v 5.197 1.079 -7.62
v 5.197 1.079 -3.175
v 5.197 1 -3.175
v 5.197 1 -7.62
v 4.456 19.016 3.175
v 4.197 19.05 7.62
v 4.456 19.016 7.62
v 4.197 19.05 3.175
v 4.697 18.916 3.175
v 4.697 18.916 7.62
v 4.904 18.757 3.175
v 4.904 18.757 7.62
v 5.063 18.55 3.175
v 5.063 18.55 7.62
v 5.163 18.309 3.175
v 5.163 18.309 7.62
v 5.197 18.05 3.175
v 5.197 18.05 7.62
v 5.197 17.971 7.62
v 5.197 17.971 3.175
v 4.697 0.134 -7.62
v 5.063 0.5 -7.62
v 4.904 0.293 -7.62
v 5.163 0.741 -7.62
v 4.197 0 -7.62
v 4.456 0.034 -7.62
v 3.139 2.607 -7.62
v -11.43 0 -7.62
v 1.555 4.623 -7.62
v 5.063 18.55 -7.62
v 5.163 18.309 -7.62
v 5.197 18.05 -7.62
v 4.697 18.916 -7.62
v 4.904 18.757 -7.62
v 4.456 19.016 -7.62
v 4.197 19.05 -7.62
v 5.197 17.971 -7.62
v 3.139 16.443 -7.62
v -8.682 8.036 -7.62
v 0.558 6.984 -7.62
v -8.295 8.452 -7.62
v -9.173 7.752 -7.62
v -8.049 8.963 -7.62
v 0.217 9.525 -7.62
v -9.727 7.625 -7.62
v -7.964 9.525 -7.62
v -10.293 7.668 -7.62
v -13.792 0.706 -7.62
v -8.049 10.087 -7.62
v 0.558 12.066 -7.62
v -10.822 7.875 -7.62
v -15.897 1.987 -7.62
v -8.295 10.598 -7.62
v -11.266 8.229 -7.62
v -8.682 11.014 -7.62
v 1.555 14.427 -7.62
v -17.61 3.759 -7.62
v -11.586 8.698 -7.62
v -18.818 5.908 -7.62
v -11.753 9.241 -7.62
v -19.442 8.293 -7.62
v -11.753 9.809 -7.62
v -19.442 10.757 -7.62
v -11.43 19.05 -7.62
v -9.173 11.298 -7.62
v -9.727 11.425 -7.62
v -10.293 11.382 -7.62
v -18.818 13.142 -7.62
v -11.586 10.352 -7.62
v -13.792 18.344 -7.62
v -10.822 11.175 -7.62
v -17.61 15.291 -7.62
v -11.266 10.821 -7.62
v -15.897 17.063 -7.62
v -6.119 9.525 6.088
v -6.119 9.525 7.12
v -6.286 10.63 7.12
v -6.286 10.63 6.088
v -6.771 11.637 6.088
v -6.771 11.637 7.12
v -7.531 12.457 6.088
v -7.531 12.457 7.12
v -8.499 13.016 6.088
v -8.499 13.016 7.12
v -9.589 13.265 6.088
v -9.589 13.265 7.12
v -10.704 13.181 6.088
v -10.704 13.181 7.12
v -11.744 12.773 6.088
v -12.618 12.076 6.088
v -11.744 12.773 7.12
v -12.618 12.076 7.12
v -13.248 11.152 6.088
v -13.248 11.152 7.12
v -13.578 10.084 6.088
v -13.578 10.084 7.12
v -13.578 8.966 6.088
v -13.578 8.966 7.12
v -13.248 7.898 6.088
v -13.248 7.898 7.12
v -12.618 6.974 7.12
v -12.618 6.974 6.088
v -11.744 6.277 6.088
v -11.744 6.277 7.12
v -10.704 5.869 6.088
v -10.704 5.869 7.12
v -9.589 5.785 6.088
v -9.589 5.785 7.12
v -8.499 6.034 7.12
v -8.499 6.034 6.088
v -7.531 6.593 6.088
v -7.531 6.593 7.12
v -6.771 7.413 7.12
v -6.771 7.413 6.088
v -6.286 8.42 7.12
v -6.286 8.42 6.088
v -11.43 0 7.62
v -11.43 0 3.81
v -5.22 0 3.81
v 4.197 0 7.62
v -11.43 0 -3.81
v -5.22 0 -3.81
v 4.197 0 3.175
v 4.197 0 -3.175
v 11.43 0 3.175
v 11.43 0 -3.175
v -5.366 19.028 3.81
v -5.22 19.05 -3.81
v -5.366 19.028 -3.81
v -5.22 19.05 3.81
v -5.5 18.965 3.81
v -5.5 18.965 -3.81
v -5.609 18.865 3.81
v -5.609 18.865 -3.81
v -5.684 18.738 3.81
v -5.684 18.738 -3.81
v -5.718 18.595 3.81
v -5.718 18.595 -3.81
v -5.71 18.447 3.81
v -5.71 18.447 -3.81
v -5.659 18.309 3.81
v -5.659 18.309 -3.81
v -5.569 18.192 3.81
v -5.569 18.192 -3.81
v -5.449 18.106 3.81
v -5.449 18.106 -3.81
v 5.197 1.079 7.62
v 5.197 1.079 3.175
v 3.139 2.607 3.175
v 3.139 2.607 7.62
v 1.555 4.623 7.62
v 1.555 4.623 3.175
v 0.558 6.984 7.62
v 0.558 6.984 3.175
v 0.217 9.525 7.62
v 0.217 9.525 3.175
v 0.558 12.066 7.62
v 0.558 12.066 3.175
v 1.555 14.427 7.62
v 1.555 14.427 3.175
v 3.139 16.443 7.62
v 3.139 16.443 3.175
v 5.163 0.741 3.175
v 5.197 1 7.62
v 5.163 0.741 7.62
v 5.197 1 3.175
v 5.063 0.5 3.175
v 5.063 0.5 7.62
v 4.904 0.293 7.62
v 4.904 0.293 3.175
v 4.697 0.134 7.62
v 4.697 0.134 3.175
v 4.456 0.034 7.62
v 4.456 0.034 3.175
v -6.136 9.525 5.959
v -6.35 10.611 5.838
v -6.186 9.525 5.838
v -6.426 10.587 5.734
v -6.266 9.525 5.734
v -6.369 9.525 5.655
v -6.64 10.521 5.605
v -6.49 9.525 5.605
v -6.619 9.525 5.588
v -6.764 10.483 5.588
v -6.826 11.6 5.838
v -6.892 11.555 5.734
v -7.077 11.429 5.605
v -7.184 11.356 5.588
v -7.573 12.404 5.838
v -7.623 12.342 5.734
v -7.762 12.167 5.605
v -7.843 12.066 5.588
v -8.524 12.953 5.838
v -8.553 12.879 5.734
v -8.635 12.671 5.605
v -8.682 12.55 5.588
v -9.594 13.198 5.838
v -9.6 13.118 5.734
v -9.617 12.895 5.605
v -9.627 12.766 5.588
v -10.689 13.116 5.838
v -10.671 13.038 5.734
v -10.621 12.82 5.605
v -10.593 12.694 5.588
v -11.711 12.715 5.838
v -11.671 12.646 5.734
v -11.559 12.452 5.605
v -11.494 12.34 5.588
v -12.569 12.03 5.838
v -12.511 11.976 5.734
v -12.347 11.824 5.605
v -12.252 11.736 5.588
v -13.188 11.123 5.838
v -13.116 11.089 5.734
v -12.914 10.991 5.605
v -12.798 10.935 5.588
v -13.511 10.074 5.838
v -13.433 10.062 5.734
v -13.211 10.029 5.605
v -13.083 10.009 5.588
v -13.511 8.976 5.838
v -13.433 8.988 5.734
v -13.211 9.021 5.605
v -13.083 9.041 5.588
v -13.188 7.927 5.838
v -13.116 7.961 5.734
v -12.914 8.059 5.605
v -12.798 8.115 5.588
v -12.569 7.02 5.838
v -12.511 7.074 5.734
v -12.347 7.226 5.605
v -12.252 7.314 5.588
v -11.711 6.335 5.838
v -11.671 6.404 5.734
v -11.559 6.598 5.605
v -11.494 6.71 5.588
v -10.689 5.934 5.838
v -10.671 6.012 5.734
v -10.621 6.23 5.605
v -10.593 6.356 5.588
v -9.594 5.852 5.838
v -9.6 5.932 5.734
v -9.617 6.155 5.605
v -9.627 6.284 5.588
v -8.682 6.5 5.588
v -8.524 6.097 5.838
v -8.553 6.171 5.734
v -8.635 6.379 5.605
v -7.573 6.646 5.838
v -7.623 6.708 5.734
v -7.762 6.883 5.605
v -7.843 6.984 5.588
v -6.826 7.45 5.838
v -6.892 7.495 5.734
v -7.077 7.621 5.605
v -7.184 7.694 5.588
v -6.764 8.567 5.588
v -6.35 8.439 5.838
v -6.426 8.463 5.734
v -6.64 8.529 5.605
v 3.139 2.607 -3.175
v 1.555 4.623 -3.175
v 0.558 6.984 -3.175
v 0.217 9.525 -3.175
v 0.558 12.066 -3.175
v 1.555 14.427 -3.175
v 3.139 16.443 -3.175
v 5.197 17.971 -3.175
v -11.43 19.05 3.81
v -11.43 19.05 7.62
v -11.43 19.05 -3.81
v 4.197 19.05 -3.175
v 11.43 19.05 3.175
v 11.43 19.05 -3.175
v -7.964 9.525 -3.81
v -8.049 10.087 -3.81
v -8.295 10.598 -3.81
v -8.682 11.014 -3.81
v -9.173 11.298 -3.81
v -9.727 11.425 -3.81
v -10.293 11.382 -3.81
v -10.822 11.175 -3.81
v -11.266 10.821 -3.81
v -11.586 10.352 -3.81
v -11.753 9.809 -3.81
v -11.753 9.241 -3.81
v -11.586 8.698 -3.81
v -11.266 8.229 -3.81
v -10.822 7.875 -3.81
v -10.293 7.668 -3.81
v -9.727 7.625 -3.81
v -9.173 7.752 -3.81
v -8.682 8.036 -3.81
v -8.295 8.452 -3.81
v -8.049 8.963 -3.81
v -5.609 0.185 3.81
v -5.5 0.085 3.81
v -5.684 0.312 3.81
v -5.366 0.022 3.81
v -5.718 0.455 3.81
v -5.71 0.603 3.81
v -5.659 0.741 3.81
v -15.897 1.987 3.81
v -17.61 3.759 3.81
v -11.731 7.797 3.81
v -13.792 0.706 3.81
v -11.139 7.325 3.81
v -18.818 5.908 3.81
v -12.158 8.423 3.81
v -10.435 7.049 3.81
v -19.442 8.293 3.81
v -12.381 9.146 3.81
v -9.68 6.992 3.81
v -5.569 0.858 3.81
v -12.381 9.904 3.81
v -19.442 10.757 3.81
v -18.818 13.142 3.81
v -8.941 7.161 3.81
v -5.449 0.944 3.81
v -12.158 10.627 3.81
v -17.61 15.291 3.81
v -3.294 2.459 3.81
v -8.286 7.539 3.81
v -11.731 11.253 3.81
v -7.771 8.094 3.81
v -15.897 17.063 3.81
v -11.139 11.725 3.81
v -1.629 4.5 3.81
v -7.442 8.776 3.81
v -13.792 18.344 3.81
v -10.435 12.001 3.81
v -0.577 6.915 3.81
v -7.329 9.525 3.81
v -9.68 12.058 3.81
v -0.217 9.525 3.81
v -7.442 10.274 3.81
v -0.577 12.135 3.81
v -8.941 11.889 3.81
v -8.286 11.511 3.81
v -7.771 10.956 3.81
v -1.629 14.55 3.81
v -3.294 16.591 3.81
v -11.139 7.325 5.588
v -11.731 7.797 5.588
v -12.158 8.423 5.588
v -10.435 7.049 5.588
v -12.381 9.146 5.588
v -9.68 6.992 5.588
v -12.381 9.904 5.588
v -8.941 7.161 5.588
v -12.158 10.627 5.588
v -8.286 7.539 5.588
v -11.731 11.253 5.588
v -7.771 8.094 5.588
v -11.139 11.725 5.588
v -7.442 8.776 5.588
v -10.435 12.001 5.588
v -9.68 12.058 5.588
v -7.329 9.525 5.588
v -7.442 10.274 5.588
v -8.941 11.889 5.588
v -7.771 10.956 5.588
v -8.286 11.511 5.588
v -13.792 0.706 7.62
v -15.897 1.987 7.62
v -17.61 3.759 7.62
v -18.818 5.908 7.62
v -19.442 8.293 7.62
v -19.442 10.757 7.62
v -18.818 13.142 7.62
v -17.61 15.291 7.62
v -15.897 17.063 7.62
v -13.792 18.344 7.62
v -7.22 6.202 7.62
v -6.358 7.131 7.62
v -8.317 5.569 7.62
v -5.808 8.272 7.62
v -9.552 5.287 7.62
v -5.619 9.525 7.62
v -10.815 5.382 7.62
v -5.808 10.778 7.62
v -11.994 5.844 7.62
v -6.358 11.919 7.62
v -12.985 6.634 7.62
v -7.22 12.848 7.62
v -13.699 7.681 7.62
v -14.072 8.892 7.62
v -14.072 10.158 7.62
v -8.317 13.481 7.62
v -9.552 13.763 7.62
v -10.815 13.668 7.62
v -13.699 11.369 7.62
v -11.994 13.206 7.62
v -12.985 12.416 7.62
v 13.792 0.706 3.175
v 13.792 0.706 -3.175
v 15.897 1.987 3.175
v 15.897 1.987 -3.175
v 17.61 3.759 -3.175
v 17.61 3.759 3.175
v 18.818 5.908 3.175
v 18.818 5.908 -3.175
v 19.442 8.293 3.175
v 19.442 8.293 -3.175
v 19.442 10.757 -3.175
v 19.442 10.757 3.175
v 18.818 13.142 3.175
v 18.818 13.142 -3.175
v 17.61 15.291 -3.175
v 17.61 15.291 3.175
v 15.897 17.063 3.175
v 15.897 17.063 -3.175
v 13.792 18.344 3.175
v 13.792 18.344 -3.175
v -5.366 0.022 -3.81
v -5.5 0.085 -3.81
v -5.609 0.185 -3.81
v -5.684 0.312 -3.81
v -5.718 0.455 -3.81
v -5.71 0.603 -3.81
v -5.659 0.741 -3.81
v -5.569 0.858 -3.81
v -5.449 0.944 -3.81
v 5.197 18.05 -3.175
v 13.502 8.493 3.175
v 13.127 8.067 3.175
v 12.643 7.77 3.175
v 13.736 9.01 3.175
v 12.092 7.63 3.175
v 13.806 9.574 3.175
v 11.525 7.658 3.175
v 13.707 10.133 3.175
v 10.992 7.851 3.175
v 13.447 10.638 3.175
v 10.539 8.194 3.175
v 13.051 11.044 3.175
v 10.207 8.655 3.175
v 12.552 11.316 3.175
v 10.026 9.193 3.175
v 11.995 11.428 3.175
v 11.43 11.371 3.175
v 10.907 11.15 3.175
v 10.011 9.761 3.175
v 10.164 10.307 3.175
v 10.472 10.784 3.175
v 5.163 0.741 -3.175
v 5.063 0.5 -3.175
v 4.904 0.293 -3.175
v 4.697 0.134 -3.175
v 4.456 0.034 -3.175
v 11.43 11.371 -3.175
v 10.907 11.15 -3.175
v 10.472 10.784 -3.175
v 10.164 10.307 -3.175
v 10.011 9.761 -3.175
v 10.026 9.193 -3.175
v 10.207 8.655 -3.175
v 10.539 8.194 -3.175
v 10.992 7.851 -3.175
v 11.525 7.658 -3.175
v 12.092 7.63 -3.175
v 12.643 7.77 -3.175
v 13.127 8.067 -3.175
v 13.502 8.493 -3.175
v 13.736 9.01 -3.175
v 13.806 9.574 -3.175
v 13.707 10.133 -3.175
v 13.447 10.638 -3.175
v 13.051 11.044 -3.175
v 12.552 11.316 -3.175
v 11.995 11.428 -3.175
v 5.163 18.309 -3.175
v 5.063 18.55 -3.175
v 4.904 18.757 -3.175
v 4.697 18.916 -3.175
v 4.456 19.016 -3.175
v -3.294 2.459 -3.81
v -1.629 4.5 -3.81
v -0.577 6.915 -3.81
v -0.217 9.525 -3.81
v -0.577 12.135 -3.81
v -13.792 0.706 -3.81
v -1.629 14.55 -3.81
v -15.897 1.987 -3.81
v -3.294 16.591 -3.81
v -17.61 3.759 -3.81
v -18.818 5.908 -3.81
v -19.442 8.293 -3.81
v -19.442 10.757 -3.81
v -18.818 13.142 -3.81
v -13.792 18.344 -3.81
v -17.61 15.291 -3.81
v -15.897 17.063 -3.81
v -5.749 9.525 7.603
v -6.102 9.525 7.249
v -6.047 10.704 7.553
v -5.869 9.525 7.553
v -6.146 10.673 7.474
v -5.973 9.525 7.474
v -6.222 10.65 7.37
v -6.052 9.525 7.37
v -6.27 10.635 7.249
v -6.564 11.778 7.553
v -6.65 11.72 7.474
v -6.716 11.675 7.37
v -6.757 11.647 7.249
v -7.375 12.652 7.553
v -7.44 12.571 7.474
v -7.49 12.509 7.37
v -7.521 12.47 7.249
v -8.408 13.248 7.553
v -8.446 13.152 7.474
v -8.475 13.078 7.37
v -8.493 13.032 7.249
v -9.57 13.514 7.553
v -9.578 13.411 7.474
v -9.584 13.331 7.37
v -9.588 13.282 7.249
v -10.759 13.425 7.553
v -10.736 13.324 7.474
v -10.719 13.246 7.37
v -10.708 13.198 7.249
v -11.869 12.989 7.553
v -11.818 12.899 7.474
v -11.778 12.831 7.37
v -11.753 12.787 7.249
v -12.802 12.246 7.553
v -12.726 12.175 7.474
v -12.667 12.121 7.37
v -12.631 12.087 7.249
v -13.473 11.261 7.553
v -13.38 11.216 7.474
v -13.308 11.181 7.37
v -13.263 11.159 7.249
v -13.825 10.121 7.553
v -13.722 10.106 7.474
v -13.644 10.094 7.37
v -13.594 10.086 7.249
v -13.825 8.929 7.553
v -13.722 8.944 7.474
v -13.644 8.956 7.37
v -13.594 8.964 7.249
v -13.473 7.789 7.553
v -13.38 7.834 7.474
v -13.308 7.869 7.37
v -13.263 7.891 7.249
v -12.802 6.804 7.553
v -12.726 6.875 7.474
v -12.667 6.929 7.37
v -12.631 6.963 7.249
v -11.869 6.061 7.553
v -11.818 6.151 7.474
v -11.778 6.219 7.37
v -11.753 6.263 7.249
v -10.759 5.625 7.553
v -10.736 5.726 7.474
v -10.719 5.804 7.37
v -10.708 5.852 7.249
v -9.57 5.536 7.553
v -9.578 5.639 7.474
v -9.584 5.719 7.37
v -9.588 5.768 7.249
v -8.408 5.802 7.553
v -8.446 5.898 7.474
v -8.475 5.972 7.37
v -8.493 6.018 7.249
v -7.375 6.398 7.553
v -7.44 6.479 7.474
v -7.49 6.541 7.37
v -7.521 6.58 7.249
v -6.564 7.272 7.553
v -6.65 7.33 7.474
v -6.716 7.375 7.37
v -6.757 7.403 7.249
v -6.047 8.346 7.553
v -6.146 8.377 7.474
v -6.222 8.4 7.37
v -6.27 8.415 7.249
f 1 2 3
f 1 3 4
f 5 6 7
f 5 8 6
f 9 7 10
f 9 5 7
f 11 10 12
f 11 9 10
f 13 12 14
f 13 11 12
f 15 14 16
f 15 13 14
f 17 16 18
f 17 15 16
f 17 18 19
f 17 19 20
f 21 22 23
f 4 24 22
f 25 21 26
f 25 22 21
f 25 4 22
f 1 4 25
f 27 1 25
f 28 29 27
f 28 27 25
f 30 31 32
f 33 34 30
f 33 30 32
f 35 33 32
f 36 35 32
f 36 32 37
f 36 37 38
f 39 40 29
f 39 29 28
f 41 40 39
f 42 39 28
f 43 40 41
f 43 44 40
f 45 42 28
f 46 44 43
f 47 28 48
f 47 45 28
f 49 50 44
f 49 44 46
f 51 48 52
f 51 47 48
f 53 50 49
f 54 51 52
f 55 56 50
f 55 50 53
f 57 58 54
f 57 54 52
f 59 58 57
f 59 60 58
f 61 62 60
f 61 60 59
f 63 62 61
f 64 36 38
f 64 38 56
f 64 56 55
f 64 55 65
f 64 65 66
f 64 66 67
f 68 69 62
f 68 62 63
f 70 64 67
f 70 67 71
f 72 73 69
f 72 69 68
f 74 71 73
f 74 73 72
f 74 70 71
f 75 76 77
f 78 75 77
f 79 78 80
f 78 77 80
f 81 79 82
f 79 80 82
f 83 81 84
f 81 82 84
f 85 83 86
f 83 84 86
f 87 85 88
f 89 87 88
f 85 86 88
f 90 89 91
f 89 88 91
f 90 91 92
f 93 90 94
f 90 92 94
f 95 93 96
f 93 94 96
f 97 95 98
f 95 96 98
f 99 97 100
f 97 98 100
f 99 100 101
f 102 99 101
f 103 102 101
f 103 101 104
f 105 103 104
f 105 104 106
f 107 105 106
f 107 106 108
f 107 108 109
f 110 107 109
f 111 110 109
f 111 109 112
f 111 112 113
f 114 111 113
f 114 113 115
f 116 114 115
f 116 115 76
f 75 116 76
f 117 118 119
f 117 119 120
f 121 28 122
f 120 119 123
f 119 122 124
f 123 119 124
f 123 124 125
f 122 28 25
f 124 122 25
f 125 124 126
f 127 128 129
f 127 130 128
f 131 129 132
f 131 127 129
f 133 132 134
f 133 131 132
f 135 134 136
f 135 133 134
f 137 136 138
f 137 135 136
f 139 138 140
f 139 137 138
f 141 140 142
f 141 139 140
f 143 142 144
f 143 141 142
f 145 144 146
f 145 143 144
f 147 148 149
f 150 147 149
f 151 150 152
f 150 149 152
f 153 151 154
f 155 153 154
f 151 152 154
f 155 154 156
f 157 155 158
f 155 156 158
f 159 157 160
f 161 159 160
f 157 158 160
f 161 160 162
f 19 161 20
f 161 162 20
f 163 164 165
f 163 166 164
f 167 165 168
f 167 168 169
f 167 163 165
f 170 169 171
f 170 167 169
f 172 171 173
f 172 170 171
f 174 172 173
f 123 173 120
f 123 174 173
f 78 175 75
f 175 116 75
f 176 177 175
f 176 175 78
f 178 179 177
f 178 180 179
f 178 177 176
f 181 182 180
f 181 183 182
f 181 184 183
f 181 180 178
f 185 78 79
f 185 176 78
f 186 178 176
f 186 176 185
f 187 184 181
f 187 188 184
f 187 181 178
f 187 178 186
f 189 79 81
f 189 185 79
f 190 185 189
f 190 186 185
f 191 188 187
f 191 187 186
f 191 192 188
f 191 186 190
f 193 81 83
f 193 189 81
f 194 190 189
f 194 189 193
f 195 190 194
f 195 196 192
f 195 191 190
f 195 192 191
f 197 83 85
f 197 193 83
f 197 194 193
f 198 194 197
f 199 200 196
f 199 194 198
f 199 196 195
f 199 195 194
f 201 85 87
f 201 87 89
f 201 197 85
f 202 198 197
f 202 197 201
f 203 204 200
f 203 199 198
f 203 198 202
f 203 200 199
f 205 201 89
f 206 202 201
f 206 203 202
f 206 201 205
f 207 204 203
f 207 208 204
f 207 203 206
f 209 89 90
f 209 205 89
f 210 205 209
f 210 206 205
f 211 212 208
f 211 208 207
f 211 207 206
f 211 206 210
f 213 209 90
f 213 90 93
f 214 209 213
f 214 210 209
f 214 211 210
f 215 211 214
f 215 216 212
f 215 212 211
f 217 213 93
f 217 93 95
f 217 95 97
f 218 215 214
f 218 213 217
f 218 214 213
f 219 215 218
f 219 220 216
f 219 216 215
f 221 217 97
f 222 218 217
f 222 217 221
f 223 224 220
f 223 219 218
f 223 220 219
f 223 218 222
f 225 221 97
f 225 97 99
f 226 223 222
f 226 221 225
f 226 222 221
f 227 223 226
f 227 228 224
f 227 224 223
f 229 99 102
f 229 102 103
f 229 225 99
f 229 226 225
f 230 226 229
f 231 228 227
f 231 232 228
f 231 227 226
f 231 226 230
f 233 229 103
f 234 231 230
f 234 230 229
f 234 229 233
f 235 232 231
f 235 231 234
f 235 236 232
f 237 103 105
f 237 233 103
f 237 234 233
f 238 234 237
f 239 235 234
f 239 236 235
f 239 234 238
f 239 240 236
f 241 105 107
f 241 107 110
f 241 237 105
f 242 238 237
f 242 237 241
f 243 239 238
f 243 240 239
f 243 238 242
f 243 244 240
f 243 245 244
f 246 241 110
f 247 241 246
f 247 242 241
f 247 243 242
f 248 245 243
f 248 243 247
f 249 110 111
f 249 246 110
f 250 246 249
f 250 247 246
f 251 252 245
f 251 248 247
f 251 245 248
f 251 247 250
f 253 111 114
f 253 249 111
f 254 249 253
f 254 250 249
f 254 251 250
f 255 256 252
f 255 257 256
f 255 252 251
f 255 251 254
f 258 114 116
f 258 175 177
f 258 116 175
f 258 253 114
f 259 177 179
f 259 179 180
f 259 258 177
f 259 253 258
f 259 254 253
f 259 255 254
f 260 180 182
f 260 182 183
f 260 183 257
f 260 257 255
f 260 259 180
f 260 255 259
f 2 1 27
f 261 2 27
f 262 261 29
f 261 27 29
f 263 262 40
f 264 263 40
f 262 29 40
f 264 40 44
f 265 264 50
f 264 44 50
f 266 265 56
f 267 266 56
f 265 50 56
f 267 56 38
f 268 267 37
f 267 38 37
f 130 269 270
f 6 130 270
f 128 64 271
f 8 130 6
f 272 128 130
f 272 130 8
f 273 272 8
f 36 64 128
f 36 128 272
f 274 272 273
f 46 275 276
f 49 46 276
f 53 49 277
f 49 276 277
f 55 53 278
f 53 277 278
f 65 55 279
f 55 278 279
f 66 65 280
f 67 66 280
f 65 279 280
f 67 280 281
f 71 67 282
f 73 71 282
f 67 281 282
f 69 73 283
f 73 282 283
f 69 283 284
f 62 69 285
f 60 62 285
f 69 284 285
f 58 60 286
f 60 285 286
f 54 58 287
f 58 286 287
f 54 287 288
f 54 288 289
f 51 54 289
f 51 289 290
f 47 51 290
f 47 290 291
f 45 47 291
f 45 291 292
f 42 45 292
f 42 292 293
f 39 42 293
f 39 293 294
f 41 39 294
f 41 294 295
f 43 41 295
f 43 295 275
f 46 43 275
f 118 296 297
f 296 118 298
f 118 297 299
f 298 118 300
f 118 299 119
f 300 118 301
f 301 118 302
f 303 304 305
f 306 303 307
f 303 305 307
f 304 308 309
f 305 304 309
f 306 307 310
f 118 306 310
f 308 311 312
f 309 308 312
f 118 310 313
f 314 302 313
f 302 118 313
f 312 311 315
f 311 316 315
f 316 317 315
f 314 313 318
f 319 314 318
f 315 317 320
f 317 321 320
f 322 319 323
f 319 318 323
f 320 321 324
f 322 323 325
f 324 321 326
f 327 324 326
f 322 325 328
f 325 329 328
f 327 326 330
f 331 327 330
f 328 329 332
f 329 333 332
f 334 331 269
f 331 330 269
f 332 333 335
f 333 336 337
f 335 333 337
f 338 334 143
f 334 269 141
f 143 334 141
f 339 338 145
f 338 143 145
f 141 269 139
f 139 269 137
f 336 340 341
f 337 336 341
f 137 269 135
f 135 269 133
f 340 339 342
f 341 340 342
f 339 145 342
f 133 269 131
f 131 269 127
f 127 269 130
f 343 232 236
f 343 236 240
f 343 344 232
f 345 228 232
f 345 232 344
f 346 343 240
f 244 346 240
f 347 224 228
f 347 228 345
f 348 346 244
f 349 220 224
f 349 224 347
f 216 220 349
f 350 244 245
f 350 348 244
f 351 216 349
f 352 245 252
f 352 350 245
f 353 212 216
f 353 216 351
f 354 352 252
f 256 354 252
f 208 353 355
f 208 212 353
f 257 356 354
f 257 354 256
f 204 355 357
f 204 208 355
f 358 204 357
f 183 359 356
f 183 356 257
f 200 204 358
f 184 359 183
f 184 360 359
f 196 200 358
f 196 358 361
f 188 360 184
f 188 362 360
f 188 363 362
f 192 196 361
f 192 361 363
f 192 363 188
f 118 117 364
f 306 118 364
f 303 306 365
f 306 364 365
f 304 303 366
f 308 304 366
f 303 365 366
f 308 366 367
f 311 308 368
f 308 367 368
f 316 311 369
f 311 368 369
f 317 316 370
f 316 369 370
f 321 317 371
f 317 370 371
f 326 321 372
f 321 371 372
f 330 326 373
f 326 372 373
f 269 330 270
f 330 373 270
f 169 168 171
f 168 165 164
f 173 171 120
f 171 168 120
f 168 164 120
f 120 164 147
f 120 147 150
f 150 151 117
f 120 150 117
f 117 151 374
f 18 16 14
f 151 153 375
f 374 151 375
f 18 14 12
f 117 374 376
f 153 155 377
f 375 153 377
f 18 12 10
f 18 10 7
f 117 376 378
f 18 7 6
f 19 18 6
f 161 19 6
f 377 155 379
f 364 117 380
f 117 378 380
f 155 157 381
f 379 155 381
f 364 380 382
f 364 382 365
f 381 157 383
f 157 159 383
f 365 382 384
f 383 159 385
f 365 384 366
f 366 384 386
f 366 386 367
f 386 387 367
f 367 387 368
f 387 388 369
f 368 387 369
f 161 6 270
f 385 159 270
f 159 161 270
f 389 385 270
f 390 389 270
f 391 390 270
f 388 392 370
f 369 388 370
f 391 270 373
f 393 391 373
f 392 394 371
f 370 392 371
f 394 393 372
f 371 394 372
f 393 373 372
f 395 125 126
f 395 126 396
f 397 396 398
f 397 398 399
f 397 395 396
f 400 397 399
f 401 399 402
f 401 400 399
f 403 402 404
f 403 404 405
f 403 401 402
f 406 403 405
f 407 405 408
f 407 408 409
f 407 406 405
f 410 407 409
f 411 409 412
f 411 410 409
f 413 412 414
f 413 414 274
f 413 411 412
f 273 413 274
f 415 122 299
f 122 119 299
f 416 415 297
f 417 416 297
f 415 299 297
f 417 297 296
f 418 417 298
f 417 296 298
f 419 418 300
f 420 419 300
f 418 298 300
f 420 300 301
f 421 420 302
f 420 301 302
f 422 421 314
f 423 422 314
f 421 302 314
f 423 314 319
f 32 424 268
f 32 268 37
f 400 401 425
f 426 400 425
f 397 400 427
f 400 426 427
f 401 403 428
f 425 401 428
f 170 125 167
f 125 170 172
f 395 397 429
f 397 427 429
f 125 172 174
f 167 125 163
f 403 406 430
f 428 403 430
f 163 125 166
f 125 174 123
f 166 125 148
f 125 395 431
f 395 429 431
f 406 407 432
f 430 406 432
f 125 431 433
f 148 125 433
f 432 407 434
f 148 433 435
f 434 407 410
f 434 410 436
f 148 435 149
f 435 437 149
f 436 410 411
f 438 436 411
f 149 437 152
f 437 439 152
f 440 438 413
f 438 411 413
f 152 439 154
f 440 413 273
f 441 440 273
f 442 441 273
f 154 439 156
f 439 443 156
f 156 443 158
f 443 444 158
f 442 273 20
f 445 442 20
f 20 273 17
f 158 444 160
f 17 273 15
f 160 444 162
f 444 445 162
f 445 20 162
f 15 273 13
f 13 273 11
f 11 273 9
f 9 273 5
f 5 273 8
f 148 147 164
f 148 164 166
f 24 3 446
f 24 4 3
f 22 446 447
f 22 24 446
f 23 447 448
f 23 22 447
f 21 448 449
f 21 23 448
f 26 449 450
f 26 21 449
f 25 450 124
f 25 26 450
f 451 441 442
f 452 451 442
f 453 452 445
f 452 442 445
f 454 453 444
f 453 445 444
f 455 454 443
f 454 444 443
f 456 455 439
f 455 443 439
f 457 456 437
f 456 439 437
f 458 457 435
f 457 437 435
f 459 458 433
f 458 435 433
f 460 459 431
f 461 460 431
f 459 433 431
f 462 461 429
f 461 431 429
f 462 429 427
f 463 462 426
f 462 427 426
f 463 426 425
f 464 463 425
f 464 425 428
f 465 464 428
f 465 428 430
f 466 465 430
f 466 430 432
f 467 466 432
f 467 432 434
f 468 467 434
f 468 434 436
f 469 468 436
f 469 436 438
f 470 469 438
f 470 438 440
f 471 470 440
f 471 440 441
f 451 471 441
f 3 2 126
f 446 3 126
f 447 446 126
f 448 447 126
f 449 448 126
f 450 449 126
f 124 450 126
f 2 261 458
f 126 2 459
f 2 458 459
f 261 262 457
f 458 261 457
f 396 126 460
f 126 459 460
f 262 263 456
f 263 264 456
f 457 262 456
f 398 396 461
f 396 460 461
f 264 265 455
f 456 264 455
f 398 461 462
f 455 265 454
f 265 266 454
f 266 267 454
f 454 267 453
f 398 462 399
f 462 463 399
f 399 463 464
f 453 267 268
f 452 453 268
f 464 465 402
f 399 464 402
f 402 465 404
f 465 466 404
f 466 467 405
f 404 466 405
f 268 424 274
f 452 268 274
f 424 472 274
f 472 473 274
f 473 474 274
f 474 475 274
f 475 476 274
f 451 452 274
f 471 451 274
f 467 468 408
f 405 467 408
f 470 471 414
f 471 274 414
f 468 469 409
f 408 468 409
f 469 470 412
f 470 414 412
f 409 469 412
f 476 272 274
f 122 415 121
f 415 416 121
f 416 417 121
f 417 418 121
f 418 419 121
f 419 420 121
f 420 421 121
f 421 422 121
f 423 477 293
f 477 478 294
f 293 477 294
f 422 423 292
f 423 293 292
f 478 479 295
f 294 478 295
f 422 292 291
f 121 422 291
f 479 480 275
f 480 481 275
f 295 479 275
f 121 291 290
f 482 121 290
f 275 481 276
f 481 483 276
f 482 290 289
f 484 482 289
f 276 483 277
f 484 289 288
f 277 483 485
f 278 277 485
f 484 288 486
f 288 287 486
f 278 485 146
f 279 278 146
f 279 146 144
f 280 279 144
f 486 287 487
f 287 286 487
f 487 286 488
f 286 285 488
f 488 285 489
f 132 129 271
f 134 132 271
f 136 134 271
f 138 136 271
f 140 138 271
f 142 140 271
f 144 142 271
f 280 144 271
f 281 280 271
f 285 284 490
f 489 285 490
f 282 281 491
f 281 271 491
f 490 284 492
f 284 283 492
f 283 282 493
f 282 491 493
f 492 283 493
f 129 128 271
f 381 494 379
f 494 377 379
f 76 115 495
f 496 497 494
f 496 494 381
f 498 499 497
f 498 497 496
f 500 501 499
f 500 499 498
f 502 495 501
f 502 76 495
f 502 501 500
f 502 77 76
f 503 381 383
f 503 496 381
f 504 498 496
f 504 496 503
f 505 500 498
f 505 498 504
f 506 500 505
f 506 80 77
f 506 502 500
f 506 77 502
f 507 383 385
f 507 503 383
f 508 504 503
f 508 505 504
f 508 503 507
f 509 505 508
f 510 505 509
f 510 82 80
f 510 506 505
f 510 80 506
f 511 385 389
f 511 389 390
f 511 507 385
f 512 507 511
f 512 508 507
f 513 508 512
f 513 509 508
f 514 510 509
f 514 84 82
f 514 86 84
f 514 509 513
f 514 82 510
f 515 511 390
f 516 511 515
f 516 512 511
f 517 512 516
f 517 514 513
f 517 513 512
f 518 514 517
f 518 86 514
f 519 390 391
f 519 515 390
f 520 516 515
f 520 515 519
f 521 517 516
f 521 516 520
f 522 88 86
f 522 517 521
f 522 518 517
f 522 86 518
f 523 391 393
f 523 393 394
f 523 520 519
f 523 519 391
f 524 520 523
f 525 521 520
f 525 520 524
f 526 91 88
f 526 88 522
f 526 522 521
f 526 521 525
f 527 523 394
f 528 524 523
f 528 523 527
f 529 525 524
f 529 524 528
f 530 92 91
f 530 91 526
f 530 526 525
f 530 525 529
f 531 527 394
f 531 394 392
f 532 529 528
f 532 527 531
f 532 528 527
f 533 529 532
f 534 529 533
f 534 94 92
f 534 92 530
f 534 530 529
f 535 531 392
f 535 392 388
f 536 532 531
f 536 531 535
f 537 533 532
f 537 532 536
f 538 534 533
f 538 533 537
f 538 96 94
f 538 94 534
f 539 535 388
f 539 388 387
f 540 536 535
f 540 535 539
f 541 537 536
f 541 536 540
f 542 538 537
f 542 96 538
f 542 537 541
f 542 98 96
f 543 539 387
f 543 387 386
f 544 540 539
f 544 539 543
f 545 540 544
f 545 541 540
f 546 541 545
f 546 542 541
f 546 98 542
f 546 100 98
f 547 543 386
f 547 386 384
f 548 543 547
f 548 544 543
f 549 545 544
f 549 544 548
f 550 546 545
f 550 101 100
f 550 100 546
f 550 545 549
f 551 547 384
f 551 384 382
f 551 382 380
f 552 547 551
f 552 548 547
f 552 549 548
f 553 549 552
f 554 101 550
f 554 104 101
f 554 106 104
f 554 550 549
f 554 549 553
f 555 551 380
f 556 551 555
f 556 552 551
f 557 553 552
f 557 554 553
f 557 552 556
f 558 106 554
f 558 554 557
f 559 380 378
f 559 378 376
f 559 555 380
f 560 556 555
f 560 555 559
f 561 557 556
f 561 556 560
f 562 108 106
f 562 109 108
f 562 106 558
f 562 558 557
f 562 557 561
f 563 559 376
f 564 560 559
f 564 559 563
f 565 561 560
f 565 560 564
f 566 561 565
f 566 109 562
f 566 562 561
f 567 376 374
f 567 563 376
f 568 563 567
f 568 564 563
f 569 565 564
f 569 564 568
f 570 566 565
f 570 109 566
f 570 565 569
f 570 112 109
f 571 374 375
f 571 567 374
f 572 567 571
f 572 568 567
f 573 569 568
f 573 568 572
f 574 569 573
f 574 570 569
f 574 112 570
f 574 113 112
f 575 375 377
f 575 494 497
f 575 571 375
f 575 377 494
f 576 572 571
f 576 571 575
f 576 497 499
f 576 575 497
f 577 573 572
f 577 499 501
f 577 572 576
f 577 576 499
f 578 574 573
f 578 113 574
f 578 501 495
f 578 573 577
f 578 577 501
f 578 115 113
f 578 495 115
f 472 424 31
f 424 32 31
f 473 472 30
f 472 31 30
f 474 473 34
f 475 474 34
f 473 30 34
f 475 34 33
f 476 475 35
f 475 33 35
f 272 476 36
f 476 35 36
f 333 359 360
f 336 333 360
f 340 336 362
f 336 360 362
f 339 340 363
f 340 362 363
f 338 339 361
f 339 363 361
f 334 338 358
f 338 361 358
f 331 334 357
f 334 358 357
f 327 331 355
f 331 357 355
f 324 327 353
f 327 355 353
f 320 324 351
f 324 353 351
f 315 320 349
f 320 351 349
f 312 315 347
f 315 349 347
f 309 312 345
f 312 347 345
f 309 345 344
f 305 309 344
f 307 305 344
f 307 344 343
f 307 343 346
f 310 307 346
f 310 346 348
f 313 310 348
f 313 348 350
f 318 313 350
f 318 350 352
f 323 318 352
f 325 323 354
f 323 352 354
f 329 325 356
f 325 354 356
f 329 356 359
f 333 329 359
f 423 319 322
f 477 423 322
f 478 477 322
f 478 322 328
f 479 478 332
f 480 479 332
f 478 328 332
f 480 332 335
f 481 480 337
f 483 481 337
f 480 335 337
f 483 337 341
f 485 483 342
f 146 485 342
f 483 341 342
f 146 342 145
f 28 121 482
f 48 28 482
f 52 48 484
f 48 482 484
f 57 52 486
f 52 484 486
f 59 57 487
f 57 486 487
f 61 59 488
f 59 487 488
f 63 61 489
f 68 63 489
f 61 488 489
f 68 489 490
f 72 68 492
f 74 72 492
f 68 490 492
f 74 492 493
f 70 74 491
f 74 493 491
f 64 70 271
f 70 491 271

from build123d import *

# Parameters (mm, degrees)
SKETCH1_W                                       = 22.86
SKETCH1_H                                       = 15.24
BOSS_EXTRUDE1_DEPTH                             = 19.05
BOSS_EXTRUDE3_DEPTH                             = 3.81
LPATTERN1_COUNT                                 = 2
LPATTERN1_PITCH                                 = 11.43
SKETCH5_R                                       = 1.905
CUT_EXTRUDE2_DEPTH                              = 16.24
CUT_EXTRUDE3_DEPTH                              = 3.81
BOSS_EXTRUDE6_DEPTH                             = 3.175
SKETCH9_R                                       = 1.905
CUT_EXTRUDE4_DEPTH                              = 6.35
CUT_EXTRUDE5_DEPTH                              = 4.445
LPATTERN2_COUNT                                 = 2
LPATTERN2_PITCH                                 = 10.795
CBORE_FOR_6_PAN_HEAD_MACHINE_SCREW3_D           = 3.7500052
CBORE_FOR_6_PAN_HEAD_MACHINE_SCREW3_CBORE_D     = 7.5000104
CBORE_FOR_6_PAN_HEAD_MACHINE_SCREW3_CBORE_DEPTH = 2.032
SKETCH18_R                                      = 2.54
CUT_EXTRUDE8_DEPTH                              = 1.778
FILLET2_R                                       = 0.5
FILLET3_R                                       = 0.5
SKETCH19_W                                      = 3.111810153
SKETCH19_H                                      = 4.445
CUT_EXTRUDE9_DEPTH                              = 19.05
LPATTERN3_COUNT                                 = 2
LPATTERN3_PITCH                                 = 10.795
FILLET4_R                                       = 1


with BuildPart() as part:
    # Sketch1 → Boss-Extrude1 (new body)
    with BuildSketch(Plane(origin=(0, 0, 0), x_dir=(1, 0, 0), z_dir=(0, 1, 0))):
        Rectangle(SKETCH1_W, SKETCH1_H)
    extrude(amount=BOSS_EXTRUDE1_DEPTH)

    # Sketch3 → Boss-Extrude3 (add)
    with BuildSketch(Plane.XY.offset(7.62)):
        with BuildLine():
            Line((-11.43, 19.05), (-11.43, 0))
            ThreePointArc((-11.43, 0), (-19.521397873, 9.525), (-11.43, 19.05))
        make_face()
    boss_extrude3 = extrude(amount=-BOSS_EXTRUDE3_DEPTH)

    # LPattern1: Boss-Extrude3 ×2
    with Locations(*[(0, 0, -i * LPATTERN1_PITCH) for i in range(1, LPATTERN1_COUNT)]):
        add(boss_extrude3)

    # Sketch5 → Cut-Extrude2 (cut, through all)
    with BuildSketch(Plane.XY.offset(7.62)):
        with Locations((-9.869397873, 9.525)):
            Circle(SKETCH5_R)
    extrude(amount=-CUT_EXTRUDE2_DEPTH, mode=Mode.SUBTRACT)

    # Sketch6 → Cut-Extrude3 (cut, symmetric)
    with BuildSketch(Plane.XY):
        with BuildLine():
            Line((-11.43, 19.05), (-11.43, 0))
            ThreePointArc((-11.43, 0), (-0.217397873, 9.525), (-11.43, 19.05))
        make_face()
    extrude(amount=CUT_EXTRUDE3_DEPTH, both=True, mode=Mode.SUBTRACT)

    # Sketch8 → Boss-Extrude6 (add, symmetric)
    with BuildSketch(Plane.XY):
        with BuildLine():
            Line((11.43, 19.05), (11.43, 0))
            ThreePointArc((11.43, 0), (19.521397873, 9.525), (11.43, 19.05))
        make_face()
    extrude(amount=BOSS_EXTRUDE6_DEPTH, both=True)

    # Sketch9 → Cut-Extrude4 (cut)
    with BuildSketch(Plane.XY.offset(3.175)):
        with Locations(Location((11.901397873, 9.525, 0), (0, 0, 104.32684201))):  # turned: the seam where the file's is
            Circle(SKETCH9_R)
    extrude(amount=-CUT_EXTRUDE4_DEPTH, mode=Mode.SUBTRACT)

    # Sketch10 → Cut-Extrude5 (cut)
    with BuildSketch(Plane.XY.offset(3.175)):
        with BuildLine():
            Line((11.43, 19.05), (11.43, 0))
            ThreePointArc((11.43, 0), (0.217397873, 9.525), (11.43, 19.05))
        make_face()
    cut_extrude5 = extrude(amount=CUT_EXTRUDE5_DEPTH, mode=Mode.SUBTRACT)

    # LPattern2: Cut-Extrude5 ×2
    with Locations(*[(0, 0, -i * LPATTERN2_PITCH) for i in range(1, LPATTERN2_COUNT)]):
        add(cut_extrude5, mode=Mode.SUBTRACT)

    # CBORE for #6 Pan Head Machine Screw3 (through all)
    with Locations(Plane.XY.offset(7.62)):
        with Locations((-9.869397873, 9.525)):
            CounterBoreHole(CBORE_FOR_6_PAN_HEAD_MACHINE_SCREW3_D / 2, CBORE_FOR_6_PAN_HEAD_MACHINE_SCREW3_CBORE_D / 2, CBORE_FOR_6_PAN_HEAD_MACHINE_SCREW3_CBORE_DEPTH)

    # Sketch18 → Cut-Extrude8 (cut)
    with BuildSketch(Plane.XY.offset(5.588)):
        with Locations((-9.869397873, 9.525)):
            Circle(SKETCH18_R)
    extrude(amount=-CUT_EXTRUDE8_DEPTH, mode=Mode.SUBTRACT)

    # Fillet2
    fillet2_edges = [part.edges().sort_by_distance(p)[0] for p in [
        (-8.308795745, 19.05, 0),
        (-8.308795745, 0, 0),
    ]]
    fillet(fillet2_edges, radius=FILLET2_R)

    # Fillet3
    fillet3_edges = [part.edges().sort_by_distance(p)[0] for p in [
        (-13.619403073, 9.525, 7.62),
        (-13.619403073, 9.525, 5.588),
    ]]
    fillet(fillet3_edges, radius=FILLET3_R)

    # Sketch19 → Cut-Extrude9 (cut)
    with BuildSketch(Plane(origin=(0, 19.05, 0), x_dir=(1, 0, 0), z_dir=(0, 1, 0))):
        with Locations((6.752890669, -5.3975)):
            Rectangle(SKETCH19_W, SKETCH19_H)
    cut_extrude9 = extrude(amount=-CUT_EXTRUDE9_DEPTH, mode=Mode.SUBTRACT)

    # LPattern3: Cut-Extrude9 ×2
    with Locations(*[(0, 0, -i * LPATTERN3_PITCH) for i in range(1, LPATTERN3_COUNT)]):
        add(cut_extrude9, mode=Mode.SUBTRACT)

    # Fillet4
    fillet4_edges = [part.edges().sort_by_distance(p)[0] for p in [
        (5.196985592, 19.05, 5.3975),
        (5.196985592, 0, 5.3975),
        (5.196985592, 19.05, -5.3975),
        (5.196985592, 0, -5.3975),
    ]]
    fillet(fillet4_edges, radius=FILLET4_R)


solid = part.part
